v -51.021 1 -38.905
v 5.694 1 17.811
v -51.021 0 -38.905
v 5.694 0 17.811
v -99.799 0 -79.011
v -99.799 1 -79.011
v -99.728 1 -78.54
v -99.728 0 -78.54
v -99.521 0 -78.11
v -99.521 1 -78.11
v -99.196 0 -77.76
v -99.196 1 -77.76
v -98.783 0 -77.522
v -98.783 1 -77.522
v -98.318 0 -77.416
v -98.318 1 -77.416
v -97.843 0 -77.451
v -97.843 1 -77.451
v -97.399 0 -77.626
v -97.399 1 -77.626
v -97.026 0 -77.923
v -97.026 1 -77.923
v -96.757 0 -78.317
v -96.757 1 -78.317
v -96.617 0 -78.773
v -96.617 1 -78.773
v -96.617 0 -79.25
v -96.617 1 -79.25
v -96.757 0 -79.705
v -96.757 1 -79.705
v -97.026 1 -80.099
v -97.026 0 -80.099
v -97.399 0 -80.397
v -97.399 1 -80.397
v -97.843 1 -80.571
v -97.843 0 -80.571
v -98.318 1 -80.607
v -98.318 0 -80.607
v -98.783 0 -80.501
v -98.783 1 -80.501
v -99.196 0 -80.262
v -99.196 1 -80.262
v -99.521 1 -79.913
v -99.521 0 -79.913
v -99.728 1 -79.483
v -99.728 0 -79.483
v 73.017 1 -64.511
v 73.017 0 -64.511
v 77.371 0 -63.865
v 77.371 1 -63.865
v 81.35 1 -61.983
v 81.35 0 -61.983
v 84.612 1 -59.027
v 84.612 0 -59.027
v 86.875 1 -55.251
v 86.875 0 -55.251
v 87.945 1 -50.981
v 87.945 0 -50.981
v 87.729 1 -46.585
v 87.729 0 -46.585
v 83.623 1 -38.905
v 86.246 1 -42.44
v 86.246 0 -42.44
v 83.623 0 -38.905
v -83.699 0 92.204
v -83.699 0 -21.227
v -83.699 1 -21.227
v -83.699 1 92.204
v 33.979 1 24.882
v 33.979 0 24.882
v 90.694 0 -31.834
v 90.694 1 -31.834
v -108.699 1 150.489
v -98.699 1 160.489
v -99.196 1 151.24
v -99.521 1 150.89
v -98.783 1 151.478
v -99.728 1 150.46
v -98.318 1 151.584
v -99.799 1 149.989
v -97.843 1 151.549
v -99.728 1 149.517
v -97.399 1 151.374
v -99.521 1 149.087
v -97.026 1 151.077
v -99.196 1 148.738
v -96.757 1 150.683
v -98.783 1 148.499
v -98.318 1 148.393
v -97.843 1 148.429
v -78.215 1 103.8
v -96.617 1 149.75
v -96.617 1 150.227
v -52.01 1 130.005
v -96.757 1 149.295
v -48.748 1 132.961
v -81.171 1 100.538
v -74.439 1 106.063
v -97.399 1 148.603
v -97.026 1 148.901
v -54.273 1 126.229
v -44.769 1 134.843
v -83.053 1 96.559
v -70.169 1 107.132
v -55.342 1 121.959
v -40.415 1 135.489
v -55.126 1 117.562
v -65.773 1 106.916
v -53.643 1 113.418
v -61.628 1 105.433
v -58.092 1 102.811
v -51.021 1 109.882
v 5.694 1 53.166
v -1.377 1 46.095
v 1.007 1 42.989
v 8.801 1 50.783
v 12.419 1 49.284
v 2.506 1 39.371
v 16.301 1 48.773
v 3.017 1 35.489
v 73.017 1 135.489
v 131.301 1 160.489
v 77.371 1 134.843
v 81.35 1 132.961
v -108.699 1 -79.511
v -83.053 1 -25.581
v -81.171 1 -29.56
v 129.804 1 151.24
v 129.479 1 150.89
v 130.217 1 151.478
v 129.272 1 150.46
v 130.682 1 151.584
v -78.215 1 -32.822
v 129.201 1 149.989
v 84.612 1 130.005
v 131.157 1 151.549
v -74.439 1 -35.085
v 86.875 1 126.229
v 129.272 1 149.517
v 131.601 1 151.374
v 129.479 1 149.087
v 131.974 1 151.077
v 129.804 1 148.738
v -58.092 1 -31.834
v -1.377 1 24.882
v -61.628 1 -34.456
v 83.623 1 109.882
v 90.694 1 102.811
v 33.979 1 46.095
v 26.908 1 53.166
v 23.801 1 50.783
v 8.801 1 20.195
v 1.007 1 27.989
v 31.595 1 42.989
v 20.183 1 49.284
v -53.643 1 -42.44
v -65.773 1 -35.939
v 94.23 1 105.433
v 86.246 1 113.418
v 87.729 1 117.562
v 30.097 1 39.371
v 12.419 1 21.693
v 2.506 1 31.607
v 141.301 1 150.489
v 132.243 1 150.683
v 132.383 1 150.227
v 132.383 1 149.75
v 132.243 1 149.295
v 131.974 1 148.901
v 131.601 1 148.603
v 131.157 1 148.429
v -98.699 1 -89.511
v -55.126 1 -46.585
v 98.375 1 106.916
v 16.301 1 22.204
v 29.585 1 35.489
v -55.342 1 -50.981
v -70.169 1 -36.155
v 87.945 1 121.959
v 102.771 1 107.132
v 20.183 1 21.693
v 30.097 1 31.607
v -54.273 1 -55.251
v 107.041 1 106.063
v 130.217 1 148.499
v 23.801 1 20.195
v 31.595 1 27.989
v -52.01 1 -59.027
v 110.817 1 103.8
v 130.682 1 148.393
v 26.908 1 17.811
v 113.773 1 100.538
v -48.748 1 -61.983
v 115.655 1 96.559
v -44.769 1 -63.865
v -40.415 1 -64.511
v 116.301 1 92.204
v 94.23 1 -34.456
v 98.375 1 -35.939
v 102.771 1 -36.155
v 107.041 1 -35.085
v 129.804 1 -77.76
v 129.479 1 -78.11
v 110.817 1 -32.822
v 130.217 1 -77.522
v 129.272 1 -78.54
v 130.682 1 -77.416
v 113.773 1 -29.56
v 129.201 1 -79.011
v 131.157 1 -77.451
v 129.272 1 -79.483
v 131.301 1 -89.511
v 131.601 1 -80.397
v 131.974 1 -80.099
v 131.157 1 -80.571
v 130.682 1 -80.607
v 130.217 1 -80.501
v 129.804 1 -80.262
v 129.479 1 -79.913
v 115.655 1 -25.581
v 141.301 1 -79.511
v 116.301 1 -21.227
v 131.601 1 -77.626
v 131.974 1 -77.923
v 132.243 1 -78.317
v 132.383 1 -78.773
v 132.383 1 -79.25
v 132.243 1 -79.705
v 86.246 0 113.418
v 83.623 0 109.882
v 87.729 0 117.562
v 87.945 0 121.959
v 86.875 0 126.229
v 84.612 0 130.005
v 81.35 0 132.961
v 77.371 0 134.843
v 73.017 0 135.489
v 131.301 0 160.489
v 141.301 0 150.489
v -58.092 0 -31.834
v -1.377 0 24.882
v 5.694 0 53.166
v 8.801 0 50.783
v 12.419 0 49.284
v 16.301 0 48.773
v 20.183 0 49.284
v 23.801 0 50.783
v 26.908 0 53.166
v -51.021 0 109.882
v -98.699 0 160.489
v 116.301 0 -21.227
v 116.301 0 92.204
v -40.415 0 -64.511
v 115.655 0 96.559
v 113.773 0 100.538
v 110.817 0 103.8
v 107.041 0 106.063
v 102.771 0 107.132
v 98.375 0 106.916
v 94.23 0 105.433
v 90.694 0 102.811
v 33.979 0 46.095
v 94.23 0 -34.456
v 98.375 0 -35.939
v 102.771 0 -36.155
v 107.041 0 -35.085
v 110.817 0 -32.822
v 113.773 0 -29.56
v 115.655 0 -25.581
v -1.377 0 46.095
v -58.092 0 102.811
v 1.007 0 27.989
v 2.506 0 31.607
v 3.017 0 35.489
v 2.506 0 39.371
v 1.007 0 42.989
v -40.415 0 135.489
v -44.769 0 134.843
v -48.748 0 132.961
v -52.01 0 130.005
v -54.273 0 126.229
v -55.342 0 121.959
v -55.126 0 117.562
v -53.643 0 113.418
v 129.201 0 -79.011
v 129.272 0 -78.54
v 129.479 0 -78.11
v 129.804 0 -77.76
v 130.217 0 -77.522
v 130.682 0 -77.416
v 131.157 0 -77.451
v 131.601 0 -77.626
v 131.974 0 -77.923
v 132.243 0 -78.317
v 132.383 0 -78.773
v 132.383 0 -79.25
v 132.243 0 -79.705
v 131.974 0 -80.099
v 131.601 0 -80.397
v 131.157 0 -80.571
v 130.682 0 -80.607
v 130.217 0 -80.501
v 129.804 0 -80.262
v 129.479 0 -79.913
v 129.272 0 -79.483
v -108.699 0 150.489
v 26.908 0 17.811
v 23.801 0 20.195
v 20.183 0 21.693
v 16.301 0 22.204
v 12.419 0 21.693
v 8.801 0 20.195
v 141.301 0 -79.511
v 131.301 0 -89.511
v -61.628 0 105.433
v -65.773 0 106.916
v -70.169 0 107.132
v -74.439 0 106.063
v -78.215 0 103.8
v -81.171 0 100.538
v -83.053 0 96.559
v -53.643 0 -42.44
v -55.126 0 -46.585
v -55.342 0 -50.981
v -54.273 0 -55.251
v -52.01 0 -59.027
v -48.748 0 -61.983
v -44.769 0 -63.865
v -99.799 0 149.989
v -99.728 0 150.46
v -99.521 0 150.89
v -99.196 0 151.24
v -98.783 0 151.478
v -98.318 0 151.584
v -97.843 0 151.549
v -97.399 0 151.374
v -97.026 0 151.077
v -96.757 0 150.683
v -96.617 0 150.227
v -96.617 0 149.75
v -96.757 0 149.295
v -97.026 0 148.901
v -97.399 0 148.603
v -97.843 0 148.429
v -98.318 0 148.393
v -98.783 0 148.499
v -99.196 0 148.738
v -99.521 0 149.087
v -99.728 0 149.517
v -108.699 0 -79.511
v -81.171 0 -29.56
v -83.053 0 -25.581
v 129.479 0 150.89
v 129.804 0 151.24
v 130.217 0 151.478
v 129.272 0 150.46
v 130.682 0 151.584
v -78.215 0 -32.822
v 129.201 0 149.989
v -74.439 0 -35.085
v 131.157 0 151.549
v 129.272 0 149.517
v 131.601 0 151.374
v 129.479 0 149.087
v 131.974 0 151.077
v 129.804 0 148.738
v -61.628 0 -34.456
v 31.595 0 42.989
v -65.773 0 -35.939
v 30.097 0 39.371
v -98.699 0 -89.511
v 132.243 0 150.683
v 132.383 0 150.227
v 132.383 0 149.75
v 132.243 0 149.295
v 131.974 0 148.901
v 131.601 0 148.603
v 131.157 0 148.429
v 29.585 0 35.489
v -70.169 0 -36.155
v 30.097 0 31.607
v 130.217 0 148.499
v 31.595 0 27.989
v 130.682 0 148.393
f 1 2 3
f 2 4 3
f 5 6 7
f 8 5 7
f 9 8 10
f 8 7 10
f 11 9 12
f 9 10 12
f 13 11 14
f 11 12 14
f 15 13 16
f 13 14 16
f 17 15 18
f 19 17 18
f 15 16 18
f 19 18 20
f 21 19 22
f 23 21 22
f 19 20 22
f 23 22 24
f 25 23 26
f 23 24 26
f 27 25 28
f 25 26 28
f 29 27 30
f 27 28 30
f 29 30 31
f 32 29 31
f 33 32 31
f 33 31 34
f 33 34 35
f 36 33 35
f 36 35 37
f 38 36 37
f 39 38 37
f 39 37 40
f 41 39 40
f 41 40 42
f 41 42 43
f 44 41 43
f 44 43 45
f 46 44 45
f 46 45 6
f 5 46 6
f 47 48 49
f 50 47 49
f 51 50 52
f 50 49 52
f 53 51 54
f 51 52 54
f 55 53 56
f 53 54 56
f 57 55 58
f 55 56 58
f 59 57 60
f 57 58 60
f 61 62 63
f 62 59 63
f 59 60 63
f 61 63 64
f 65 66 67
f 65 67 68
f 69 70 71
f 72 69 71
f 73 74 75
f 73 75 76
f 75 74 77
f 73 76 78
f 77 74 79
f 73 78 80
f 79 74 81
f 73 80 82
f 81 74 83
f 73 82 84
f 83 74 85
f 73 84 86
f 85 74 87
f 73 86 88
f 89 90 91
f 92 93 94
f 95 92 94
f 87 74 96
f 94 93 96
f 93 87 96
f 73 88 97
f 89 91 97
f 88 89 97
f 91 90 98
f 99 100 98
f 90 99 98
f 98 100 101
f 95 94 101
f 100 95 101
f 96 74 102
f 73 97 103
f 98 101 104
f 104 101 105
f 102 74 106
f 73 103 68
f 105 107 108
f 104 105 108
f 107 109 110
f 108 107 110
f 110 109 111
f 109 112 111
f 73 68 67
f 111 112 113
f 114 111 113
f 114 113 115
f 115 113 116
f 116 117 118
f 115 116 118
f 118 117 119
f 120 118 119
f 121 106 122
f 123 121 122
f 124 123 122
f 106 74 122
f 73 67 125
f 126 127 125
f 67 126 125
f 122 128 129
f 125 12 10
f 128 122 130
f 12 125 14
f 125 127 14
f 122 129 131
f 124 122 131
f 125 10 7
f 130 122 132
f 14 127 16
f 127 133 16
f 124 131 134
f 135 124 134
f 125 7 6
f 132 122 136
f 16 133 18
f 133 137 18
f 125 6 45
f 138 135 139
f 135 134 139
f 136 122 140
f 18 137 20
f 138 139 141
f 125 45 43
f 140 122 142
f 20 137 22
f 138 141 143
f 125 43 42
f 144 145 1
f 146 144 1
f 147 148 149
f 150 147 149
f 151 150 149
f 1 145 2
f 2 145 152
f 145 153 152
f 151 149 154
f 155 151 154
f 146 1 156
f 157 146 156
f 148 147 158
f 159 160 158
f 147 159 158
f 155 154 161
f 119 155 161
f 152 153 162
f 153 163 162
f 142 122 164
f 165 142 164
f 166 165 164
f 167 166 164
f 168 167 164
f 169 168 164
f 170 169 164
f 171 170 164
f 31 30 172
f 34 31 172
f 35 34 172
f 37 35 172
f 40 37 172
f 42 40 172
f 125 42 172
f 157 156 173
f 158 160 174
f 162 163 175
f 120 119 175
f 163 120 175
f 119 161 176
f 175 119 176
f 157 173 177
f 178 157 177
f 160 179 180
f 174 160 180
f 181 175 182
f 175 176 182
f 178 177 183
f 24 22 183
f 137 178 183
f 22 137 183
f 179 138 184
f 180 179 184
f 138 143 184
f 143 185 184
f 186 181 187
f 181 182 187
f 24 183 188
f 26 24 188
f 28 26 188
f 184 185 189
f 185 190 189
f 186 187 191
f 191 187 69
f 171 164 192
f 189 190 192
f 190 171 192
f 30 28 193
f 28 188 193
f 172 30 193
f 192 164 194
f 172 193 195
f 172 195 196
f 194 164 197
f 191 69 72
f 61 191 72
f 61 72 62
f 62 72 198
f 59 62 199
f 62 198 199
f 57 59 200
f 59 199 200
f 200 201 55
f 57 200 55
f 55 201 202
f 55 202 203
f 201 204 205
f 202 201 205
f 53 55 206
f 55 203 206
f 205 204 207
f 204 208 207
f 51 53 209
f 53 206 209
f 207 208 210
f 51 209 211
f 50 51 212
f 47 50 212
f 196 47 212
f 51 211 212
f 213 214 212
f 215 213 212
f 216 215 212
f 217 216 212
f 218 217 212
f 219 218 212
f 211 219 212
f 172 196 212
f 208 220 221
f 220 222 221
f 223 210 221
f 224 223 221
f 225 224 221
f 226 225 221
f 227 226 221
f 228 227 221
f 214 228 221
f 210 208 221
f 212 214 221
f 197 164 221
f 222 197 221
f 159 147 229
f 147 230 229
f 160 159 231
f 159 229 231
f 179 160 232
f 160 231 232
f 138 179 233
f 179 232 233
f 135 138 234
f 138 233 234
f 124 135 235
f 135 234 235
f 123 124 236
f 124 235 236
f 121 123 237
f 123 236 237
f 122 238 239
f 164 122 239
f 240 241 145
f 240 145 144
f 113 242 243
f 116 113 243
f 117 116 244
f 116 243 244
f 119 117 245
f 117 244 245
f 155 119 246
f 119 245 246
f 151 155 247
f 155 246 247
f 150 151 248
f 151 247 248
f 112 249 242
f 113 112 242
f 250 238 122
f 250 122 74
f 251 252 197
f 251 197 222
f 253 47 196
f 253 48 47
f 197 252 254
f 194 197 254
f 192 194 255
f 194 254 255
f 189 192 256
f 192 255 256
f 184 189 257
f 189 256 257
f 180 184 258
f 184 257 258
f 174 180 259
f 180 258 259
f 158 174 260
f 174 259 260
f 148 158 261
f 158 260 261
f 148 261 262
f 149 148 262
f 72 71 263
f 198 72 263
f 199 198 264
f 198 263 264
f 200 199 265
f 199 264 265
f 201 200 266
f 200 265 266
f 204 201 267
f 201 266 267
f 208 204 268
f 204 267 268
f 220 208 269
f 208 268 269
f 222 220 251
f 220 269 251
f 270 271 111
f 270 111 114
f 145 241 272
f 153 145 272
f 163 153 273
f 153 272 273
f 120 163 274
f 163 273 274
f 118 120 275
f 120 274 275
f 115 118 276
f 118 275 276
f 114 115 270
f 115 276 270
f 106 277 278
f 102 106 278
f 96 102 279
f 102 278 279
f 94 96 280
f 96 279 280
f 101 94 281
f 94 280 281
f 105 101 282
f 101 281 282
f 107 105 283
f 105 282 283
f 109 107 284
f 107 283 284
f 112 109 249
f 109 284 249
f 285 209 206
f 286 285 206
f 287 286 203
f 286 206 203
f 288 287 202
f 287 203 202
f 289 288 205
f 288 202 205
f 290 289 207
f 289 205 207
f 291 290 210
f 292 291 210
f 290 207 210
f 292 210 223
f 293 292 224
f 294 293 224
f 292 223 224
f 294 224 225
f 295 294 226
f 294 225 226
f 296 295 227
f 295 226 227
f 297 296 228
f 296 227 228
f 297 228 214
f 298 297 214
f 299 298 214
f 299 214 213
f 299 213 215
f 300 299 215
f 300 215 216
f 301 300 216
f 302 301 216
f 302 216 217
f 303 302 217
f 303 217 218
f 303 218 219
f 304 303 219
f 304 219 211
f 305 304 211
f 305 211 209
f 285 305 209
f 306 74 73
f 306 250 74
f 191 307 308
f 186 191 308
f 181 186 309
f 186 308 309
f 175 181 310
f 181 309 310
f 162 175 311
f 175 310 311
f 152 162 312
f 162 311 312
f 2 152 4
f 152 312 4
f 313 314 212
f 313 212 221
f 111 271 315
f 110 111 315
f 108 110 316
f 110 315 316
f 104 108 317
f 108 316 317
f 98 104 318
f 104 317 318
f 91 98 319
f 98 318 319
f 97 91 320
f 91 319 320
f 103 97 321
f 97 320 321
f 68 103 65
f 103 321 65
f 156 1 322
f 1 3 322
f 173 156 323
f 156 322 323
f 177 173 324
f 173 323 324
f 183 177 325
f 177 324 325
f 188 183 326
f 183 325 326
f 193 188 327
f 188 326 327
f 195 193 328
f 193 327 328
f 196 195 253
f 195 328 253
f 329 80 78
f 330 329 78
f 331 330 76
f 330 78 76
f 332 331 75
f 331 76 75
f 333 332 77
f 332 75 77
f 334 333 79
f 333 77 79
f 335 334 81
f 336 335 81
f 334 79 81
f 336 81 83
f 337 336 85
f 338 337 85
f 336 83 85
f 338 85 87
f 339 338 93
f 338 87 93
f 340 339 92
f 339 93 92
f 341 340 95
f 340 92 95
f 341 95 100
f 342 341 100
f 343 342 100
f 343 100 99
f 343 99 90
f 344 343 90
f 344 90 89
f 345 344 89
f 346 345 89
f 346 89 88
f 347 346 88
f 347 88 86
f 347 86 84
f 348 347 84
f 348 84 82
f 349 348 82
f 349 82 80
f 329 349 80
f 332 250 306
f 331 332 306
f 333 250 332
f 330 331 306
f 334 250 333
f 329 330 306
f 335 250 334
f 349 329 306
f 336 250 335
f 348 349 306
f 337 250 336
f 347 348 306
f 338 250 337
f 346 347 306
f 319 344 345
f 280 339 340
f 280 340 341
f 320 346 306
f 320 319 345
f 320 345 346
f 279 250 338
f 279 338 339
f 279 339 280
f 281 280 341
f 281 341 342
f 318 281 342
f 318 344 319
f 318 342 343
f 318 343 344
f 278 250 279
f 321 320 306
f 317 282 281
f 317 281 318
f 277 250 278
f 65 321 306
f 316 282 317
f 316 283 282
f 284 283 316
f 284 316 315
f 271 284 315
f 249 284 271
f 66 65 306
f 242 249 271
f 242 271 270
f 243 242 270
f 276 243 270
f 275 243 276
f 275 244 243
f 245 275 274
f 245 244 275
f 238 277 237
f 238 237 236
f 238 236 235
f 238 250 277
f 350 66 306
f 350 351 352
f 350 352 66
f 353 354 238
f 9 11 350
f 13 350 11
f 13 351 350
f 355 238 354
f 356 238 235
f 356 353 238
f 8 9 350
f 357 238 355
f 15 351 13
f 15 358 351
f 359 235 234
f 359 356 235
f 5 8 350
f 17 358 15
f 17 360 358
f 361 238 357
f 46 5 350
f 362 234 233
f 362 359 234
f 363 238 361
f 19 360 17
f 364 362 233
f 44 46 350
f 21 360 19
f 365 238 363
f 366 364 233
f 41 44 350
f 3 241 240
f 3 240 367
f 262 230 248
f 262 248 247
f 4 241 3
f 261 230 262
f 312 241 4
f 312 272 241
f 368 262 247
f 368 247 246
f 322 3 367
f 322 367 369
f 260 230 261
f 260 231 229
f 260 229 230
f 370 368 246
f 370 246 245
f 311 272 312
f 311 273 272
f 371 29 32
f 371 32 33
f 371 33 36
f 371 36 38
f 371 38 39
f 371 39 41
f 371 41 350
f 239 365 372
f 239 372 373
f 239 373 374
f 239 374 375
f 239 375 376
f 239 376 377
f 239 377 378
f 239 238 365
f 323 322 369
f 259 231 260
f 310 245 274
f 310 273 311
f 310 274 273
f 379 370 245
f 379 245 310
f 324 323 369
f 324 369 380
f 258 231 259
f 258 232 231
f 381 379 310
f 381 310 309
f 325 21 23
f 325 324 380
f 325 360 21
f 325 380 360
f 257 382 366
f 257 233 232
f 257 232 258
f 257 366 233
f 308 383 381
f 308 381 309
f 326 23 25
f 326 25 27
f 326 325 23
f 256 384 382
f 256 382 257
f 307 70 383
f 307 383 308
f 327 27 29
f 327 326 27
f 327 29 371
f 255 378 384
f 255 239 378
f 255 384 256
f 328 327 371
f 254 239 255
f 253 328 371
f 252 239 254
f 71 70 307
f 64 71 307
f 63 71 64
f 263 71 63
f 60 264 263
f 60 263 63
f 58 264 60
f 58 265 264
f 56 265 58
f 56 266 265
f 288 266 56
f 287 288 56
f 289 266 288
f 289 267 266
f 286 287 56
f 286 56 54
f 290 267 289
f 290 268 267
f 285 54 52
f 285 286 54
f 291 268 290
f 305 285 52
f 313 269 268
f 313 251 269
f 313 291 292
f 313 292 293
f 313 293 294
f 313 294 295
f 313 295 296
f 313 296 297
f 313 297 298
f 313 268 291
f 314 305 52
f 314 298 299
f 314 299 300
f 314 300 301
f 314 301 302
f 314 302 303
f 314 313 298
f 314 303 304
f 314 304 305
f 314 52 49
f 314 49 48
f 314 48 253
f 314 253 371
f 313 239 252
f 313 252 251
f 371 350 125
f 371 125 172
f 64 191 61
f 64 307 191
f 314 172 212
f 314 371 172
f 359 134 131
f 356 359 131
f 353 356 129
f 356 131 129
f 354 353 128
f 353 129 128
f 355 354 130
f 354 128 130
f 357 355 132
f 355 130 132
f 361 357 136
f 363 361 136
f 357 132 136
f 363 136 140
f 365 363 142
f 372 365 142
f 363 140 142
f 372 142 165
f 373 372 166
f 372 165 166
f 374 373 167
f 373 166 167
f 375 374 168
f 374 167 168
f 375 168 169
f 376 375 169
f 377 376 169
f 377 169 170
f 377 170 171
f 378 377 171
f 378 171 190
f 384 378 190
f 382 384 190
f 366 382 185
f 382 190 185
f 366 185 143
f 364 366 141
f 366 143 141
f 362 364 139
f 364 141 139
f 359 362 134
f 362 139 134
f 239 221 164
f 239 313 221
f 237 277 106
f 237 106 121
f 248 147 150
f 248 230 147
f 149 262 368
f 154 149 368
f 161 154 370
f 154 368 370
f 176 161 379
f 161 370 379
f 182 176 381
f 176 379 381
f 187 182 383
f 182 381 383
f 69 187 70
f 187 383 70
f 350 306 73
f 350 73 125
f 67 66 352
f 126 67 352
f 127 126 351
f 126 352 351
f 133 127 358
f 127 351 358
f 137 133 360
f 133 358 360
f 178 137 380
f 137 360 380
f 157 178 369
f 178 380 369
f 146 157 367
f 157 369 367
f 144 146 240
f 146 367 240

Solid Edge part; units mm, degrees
sketch "Sketch1" plane through (0, 0, 0) normal (0, -1, 0) x (1, 0, 0)
  line L0 (141.3011, -89.5112) -> (141.3011, 160.4888)
  line L1 (141.3011, 160.4888) -> (-108.6989, 160.4888)
  line L2 (-108.6989, 160.4888) -> (-108.6989, -89.5112)
  line L3 (-108.6989, -89.5112) -> (141.3011, -89.5112)
extrude "Protrusion1" add sketch "Sketch1" against normal blind 1
sketch "Sketch2" plane through (16.3011, 0, 35.4888) normal (0, -1, 0) x (1, 0, 0)
  line L0 (-10.6066, -17.6777) -> (-67.3223, -74.3934)
  arc A0 (-67.3223, -74.3934) -> (-56.7157, -100) centre (-56.7157, -85) ccw
  line L1 (56.7157, -100) -> (-56.7157, -100)
  arc A1 (67.3223, -74.3934) -> (56.7157, -100) centre (56.7157, -85) cw
  line L2 (10.6066, -17.6777) -> (67.3223, -74.3934)
  arc A2 (-10.6066, -17.6777) -> (10.6066, -17.6777) centre (0, -28.2843) cw
  line L3 (-17.6777, -10.6066) -> (-74.3934, -67.3223)
  arc A3 (-74.3934, -67.3223) -> (-100, -56.7157) centre (-85, -56.7157) cw
  line L4 (-100, -56.7157) -> (-100, 56.7157)
  arc A4 (-100, 56.7157) -> (-74.3934, 67.3223) centre (-85, 56.7157) cw
  line L5 (-74.3934, 67.3223) -> (-17.6777, 10.6066)
  arc A5 (-17.6777, 10.6066) -> (-17.6777, -10.6066) centre (-28.2843, 0) cw
  arc A6 (10.6066, 17.6777) -> (-10.6066, 17.6777) centre (0, 28.2843) cw
  line L6 (-67.3223, 74.3934) -> (-10.6066, 17.6777)
  arc A7 (-56.7157, 100) -> (-67.3223, 74.3934) centre (-56.7157, 85) ccw
  line L7 (-56.7157, 100) -> (56.7157, 100)
  arc A8 (56.7157, 100) -> (67.3223, 74.3934) centre (56.7157, 85) cw
  line L8 (67.3223, 74.3934) -> (10.6066, 17.6777)
  arc A9 (17.6777, -10.6066) -> (17.6777, 10.6066) centre (28.2843, 0) cw
  line L9 (74.3934, 67.3223) -> (17.6777, 10.6066)
  arc A10 (74.3934, 67.3223) -> (100, 56.7157) centre (85, 56.7157) cw
  line L10 (100, 56.7157) -> (100, -56.7157)
  arc A11 (74.3934, -67.3223) -> (100, -56.7157) centre (85, -56.7157) ccw
  line L11 (17.6777, -10.6066) -> (74.3934, -67.3223)
  dimension "D1" = 25
extrude "ExtrudedCutout_1" cut sketch "Sketch2" against normal blind 1
sketch "Sketch3" plane through (16.3011, 0, 35.4888) normal (0, -1, 0) x (-1, 0, 0)
  line L0 (-115, -125) -> (-125, -115)
  line L1 (-125, -125) -> (-125, -115)
  line L2 (-125, -125) -> (-115, -125)
  line L3 (-115, 125) -> (-125, 115)
  line L4 (-125, 125) -> (-125, 115)
  line L5 (-125, 125) -> (-115, 125)
  line L6 (125, 115) -> (115, 125)
  line L7 (125, 125) -> (115, 125)
  line L8 (125, 125) -> (125, 115)
  line L9 (115, -125) -> (125, -115)
  line L10 (125, -125) -> (125, -115)
  line L11 (125, -125) -> (115, -125)
extrude "ExtrudedCutout_2" cut sketch "Sketch3" against normal blind 1
sketch "Sketch4" plane through (16.3011, 1, 35.4888) normal (0, 1, 0) x (-1, 0, 0)
  circle A0 centre (114.5, -114.5) radius 1.6
  circle A1 centre (-114.5, -114.5) radius 1.6
  circle A2 centre (114.5, 114.5) radius 1.6
  circle A3 centre (-114.5, 114.5) radius 1.6
extrude "Cutout1" cut sketch "Sketch4" against normal up to next
